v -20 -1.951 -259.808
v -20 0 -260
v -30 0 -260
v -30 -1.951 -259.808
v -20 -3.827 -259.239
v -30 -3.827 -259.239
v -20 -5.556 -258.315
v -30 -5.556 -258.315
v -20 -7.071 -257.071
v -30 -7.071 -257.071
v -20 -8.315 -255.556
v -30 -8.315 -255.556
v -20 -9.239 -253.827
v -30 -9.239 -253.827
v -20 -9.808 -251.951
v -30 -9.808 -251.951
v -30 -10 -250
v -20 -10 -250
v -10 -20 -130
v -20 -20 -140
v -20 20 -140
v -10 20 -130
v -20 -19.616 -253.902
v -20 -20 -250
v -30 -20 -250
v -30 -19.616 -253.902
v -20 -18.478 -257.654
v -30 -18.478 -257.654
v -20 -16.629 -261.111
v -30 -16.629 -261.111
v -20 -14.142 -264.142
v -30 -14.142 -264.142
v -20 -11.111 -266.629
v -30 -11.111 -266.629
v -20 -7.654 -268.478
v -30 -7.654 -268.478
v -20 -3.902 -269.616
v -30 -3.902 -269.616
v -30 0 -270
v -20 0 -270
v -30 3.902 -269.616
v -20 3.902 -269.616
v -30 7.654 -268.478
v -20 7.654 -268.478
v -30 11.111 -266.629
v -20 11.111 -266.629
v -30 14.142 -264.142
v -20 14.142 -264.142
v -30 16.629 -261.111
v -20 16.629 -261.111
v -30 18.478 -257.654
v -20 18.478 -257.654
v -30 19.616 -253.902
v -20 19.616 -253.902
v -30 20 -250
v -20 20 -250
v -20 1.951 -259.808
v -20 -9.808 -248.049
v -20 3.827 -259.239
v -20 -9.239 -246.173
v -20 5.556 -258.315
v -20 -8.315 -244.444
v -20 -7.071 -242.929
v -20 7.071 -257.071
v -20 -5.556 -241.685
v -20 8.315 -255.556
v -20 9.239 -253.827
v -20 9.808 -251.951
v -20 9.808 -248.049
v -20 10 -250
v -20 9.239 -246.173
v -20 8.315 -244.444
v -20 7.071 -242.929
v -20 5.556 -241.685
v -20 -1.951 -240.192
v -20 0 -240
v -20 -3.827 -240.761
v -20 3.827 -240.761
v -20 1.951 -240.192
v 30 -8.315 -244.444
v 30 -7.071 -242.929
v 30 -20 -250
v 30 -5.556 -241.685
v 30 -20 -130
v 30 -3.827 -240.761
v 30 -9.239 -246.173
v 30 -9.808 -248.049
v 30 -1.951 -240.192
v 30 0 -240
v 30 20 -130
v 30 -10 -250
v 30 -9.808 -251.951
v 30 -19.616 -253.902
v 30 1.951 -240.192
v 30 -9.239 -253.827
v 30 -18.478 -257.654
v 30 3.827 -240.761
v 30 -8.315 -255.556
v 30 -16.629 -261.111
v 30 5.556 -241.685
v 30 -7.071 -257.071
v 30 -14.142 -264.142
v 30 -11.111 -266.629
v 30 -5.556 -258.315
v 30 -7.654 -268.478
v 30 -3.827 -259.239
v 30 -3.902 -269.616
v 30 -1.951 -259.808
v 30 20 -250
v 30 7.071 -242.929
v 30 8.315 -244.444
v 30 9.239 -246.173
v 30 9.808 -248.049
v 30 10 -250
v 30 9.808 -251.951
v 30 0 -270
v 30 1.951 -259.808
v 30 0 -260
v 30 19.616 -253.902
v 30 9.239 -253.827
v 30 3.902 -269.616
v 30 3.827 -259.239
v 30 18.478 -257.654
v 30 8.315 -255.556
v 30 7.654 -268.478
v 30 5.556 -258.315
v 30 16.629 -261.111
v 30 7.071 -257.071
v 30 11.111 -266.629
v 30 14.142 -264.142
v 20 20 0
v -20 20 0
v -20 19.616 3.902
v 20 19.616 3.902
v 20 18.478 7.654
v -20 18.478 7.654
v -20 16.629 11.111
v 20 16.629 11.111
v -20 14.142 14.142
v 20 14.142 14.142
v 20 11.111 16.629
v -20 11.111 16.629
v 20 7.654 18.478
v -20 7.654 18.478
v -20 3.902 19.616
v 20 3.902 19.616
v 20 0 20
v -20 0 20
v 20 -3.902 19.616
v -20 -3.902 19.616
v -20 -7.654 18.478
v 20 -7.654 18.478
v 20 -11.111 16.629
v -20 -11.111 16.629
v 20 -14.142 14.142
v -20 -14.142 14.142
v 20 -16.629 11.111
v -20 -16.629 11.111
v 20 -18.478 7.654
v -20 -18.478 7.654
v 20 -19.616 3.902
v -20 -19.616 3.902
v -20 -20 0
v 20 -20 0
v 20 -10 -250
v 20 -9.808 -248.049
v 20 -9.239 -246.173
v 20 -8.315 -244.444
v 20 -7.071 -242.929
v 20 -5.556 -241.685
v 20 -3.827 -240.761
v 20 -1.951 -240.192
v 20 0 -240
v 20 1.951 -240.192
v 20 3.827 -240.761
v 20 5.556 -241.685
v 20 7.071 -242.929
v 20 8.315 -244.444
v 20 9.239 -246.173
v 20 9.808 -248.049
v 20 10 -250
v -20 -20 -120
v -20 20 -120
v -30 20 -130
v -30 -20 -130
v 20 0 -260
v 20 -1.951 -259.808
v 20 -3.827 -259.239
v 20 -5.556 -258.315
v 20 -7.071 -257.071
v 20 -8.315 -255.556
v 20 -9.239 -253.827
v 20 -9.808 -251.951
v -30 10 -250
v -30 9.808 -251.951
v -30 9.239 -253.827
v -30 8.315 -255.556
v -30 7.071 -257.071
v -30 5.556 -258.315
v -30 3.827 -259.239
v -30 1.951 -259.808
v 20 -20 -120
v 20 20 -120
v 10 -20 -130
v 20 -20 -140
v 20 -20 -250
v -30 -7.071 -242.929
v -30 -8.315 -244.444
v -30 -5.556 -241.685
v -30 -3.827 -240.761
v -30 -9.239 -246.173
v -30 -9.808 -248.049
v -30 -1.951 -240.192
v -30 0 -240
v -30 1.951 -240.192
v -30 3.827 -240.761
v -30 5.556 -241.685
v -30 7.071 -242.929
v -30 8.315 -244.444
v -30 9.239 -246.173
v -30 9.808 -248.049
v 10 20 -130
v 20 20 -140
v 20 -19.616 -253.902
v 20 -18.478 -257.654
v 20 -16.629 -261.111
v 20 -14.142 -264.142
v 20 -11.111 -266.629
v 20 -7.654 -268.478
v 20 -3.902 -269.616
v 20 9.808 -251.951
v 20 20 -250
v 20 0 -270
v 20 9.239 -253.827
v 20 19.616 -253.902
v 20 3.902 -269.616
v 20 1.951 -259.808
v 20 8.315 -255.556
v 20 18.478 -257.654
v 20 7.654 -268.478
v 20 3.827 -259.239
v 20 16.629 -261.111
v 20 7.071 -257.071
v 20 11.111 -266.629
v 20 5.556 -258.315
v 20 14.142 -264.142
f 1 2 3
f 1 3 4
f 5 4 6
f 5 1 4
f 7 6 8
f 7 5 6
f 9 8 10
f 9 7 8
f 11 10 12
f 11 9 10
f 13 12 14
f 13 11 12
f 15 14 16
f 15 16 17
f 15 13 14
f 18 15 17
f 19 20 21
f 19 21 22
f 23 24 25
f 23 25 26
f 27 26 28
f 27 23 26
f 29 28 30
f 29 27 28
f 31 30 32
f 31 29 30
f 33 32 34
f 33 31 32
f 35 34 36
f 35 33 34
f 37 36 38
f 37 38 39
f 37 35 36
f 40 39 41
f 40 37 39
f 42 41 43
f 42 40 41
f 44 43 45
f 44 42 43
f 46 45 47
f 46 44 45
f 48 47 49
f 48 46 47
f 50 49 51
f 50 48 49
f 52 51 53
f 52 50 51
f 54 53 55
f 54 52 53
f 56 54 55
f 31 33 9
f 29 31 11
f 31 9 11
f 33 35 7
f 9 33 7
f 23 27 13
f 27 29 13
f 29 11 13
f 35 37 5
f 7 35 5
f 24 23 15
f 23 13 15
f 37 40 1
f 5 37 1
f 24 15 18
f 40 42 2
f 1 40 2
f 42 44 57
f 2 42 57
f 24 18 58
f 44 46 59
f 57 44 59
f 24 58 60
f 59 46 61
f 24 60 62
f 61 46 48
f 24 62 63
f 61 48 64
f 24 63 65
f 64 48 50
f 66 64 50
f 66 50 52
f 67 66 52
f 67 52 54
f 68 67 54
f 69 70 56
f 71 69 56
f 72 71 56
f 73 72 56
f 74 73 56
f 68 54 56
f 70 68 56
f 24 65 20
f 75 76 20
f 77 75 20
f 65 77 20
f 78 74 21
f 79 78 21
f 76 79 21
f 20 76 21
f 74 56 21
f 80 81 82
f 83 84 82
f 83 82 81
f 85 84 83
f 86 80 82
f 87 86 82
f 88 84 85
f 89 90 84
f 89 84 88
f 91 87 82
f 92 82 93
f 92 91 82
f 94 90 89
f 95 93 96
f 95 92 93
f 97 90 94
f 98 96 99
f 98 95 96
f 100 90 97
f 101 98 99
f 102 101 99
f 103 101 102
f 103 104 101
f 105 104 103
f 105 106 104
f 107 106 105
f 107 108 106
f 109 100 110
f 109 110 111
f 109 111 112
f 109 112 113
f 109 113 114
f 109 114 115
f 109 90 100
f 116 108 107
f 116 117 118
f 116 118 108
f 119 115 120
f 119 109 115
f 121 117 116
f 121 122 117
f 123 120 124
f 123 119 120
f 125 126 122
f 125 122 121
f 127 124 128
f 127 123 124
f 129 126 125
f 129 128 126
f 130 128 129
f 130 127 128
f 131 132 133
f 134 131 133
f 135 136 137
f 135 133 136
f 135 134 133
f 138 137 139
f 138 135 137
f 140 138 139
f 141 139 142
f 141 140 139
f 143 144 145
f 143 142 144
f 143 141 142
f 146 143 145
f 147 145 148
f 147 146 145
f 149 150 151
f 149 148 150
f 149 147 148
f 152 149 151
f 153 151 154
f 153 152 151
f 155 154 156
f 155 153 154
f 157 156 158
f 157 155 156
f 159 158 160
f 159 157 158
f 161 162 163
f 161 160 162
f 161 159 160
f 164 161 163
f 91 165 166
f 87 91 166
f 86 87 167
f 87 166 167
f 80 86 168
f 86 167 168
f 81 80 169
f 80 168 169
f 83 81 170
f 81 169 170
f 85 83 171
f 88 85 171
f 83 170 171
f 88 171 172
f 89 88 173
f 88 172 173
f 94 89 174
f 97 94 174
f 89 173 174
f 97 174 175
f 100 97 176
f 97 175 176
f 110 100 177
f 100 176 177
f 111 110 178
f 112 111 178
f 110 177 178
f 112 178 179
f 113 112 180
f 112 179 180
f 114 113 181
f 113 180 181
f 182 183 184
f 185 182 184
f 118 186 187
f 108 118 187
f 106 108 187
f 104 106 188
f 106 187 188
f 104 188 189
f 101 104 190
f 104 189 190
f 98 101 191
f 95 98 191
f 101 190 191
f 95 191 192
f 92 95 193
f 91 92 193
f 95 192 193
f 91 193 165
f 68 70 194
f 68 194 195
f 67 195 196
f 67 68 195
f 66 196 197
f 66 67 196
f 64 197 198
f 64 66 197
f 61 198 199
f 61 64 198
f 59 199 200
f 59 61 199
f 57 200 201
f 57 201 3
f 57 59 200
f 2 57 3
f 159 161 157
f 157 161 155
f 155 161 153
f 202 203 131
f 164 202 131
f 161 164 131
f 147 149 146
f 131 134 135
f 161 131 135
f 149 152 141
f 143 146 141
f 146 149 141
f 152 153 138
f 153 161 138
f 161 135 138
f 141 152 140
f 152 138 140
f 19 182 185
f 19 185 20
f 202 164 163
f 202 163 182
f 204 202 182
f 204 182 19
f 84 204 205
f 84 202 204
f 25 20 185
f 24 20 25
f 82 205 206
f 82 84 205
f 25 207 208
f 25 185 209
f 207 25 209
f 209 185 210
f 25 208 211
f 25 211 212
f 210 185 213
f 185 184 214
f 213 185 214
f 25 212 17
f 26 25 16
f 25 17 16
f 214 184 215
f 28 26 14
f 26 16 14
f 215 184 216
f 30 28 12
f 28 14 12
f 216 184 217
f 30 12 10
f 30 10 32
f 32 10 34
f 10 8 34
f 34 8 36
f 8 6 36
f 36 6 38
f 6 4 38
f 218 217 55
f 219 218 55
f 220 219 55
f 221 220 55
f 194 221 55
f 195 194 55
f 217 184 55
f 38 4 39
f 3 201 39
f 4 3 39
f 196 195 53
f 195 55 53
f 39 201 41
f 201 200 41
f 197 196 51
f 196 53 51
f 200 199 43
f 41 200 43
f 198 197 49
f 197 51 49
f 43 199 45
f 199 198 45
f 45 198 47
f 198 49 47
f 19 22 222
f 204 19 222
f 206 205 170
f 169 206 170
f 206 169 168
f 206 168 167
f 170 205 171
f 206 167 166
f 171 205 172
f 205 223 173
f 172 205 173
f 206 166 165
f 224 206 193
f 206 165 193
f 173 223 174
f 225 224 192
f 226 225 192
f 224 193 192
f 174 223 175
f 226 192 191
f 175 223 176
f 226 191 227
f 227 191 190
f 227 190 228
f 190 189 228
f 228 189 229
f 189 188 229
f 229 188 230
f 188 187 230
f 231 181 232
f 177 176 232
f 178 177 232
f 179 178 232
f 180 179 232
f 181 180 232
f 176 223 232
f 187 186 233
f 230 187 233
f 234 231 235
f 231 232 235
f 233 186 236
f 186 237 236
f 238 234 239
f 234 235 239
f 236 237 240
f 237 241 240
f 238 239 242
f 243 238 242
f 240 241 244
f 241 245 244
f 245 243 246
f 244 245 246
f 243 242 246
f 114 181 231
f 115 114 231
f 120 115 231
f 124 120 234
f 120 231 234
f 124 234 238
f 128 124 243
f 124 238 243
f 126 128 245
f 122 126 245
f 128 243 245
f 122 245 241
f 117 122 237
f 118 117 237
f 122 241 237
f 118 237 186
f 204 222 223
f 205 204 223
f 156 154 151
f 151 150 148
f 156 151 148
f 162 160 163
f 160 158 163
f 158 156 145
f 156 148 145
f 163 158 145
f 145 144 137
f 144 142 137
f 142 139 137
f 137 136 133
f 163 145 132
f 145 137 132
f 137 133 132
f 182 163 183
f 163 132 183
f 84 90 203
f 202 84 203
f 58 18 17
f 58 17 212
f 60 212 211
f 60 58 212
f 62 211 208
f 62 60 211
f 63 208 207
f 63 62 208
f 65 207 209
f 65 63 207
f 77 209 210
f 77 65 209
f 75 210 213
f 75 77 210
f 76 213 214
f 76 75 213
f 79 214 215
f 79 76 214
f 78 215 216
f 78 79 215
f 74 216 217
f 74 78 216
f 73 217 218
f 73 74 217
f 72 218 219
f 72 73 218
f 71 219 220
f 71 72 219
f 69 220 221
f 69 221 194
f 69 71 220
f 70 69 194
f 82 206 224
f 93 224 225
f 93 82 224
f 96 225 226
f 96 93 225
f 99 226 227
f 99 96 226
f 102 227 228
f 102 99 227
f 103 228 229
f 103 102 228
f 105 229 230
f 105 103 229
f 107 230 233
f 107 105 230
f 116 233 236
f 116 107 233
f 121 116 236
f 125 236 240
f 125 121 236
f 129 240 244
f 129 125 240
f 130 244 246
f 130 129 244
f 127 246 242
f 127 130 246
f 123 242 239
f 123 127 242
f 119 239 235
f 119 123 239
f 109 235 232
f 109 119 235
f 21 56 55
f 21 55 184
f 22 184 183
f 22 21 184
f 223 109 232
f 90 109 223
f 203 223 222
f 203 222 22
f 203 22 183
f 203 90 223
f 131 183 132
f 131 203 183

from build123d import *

# Parameters (mm, degrees)
BOSS_EXTRUDE1_DEPTH = 30
SKETCH2_W           = 40
SKETCH2_H           = 20
SKETCH2_W_2         = 10
CUT_EXTRUDE1_DEPTH  = 275.590604355


with BuildPart() as part:
    # Sketch1 → Boss-Extrude1 (new, symmetric)
    with BuildSketch(Plane(origin=(0, 0, 0), x_dir=(0, 0, -1), z_dir=(1, 0, 0))):
        with BuildLine():
            ThreePointArc((20, 0), (14.142135624, 14.142135624), (0, 20))
            Line((0, 20), (0, 10))
            ThreePointArc((0, 10), (7.071067812, 7.071067812), (10, 0))
            ThreePointArc((10, 0), (7.071067812, -7.071067812), (0, -10))
            Line((0, -10), (0, -20))
            ThreePointArc((0, -20), (14.142135624, -14.142135624), (20, 0))
        make_face()
        with BuildLine():
            Line((0, 10), (0, 20))
            ThreePointArc((0, 20), (-20, 0), (0, -20))
            Line((0, -20), (0, -10))
            ThreePointArc((0, -10), (-10, 0), (0, 10))
        make_face()
        with BuildLine():
            ThreePointArc((20, 0), (14.142135624, 14.142135624), (0, 20))
            Line((0, 20), (0, 10))
            ThreePointArc((0, 10), (7.071067812, 7.071067812), (10, 0))
            ThreePointArc((10, 0), (7.071067812, -7.071067812), (0, -10))
            Line((0, -10), (0, -20))
            ThreePointArc((0, -20), (14.142135624, -14.142135624), (20, 0))
        make_face()
        with BuildLine():
            Line((0, 10), (0, 20))
            ThreePointArc((0, 20), (-20, 0), (0, -20))
            Line((0, -20), (0, -10))
            ThreePointArc((0, -10), (-10, 0), (0, 10))
        make_face()
        with BuildLine():
            Line((250, 20), (0, 20))
            ThreePointArc((0, 20), (14.142135624, 14.142135624), (20, 0))
            ThreePointArc((20, 0), (14.142135624, -14.142135624), (0, -20))
            Line((0, -20), (250, -20))
            ThreePointArc((250, -20), (230, 0), (250, 20))
        make_face()
        with BuildLine():
            ThreePointArc((270, 0), (264.142135624, 14.142135624), (250, 20))
            Line((250, 20), (250, 10))
            ThreePointArc((250, 10), (257.071067812, 7.071067812), (260, 0))
            ThreePointArc((260, 0), (257.071067812, -7.071067812), (250, -10))
            Line((250, -10), (250, -20))
            ThreePointArc((250, -20), (264.142135624, -14.142135624), (270, 0))
        make_face()
        with BuildLine():
            Line((250, 10), (250, 20))
            ThreePointArc((250, 20), (230, 0), (250, -20))
            Line((250, -20), (250, -10))
            ThreePointArc((250, -10), (240, 0), (250, 10))
        make_face()
        with BuildLine():
            ThreePointArc((270, 0), (264.142135624, 14.142135624), (250, 20))
            Line((250, 20), (250, 10))
            ThreePointArc((250, 10), (257.071067812, 7.071067812), (260, 0))
            ThreePointArc((260, 0), (257.071067812, -7.071067812), (250, -10))
            Line((250, -10), (250, -20))
            ThreePointArc((250, -20), (264.142135624, -14.142135624), (270, 0))
        make_face()
        with BuildLine():
            Line((250, 10), (250, 20))
            ThreePointArc((250, 20), (230, 0), (250, -20))
            Line((250, -20), (250, -10))
            ThreePointArc((250, -10), (240, 0), (250, 10))
        make_face()
        with BuildLine():
            ThreePointArc((10, 0), (7.071067812, 7.071067812), (0, 10))
            Line((0, 10), (0, -10))
            ThreePointArc((0, -10), (7.071067812, -7.071067812), (10, 0))
        make_face()
        with BuildLine():
            Line((0, -10), (0, 10))
            ThreePointArc((0, 10), (-10, 0), (0, -10))
        make_face()
        with BuildLine():
            ThreePointArc((10, 0), (7.071067812, 7.071067812), (0, 10))
            Line((0, 10), (0, -10))
            ThreePointArc((0, -10), (7.071067812, -7.071067812), (10, 0))
        make_face()
        with BuildLine():
            Line((0, -10), (0, 10))
            ThreePointArc((0, 10), (-10, 0), (0, -10))
        make_face()
    extrude(amount=BOSS_EXTRUDE1_DEPTH, both=True)

    # Sketch2 → Cut-Extrude1 (cut, through all)
    with BuildSketch(Plane(origin=(0, 20, 0), x_dir=(1, 0, 0), z_dir=(0, 1, 0))):
        with Locations((0, 260)):
            Rectangle(SKETCH2_W, SKETCH2_H)
        Polygon((20, 250), (-20, 250), (-20, 140), (-10, 130), (10, 130), (20, 140), align=None)
        Polygon((-20, 120), (-30, 130), (-30, 0), (-20, 0), align=None)
        Polygon((30, 130), (20, 120), (20, 0), (30, 0), align=None)
        with Locations((-25, -10)):
            Rectangle(SKETCH2_W_2, SKETCH2_H)
        with Locations((25, -10)):
            Rectangle(SKETCH2_W_2, SKETCH2_H)
    extrude(amount=-CUT_EXTRUDE1_DEPTH, mode=Mode.SUBTRACT)


solid = part.part
